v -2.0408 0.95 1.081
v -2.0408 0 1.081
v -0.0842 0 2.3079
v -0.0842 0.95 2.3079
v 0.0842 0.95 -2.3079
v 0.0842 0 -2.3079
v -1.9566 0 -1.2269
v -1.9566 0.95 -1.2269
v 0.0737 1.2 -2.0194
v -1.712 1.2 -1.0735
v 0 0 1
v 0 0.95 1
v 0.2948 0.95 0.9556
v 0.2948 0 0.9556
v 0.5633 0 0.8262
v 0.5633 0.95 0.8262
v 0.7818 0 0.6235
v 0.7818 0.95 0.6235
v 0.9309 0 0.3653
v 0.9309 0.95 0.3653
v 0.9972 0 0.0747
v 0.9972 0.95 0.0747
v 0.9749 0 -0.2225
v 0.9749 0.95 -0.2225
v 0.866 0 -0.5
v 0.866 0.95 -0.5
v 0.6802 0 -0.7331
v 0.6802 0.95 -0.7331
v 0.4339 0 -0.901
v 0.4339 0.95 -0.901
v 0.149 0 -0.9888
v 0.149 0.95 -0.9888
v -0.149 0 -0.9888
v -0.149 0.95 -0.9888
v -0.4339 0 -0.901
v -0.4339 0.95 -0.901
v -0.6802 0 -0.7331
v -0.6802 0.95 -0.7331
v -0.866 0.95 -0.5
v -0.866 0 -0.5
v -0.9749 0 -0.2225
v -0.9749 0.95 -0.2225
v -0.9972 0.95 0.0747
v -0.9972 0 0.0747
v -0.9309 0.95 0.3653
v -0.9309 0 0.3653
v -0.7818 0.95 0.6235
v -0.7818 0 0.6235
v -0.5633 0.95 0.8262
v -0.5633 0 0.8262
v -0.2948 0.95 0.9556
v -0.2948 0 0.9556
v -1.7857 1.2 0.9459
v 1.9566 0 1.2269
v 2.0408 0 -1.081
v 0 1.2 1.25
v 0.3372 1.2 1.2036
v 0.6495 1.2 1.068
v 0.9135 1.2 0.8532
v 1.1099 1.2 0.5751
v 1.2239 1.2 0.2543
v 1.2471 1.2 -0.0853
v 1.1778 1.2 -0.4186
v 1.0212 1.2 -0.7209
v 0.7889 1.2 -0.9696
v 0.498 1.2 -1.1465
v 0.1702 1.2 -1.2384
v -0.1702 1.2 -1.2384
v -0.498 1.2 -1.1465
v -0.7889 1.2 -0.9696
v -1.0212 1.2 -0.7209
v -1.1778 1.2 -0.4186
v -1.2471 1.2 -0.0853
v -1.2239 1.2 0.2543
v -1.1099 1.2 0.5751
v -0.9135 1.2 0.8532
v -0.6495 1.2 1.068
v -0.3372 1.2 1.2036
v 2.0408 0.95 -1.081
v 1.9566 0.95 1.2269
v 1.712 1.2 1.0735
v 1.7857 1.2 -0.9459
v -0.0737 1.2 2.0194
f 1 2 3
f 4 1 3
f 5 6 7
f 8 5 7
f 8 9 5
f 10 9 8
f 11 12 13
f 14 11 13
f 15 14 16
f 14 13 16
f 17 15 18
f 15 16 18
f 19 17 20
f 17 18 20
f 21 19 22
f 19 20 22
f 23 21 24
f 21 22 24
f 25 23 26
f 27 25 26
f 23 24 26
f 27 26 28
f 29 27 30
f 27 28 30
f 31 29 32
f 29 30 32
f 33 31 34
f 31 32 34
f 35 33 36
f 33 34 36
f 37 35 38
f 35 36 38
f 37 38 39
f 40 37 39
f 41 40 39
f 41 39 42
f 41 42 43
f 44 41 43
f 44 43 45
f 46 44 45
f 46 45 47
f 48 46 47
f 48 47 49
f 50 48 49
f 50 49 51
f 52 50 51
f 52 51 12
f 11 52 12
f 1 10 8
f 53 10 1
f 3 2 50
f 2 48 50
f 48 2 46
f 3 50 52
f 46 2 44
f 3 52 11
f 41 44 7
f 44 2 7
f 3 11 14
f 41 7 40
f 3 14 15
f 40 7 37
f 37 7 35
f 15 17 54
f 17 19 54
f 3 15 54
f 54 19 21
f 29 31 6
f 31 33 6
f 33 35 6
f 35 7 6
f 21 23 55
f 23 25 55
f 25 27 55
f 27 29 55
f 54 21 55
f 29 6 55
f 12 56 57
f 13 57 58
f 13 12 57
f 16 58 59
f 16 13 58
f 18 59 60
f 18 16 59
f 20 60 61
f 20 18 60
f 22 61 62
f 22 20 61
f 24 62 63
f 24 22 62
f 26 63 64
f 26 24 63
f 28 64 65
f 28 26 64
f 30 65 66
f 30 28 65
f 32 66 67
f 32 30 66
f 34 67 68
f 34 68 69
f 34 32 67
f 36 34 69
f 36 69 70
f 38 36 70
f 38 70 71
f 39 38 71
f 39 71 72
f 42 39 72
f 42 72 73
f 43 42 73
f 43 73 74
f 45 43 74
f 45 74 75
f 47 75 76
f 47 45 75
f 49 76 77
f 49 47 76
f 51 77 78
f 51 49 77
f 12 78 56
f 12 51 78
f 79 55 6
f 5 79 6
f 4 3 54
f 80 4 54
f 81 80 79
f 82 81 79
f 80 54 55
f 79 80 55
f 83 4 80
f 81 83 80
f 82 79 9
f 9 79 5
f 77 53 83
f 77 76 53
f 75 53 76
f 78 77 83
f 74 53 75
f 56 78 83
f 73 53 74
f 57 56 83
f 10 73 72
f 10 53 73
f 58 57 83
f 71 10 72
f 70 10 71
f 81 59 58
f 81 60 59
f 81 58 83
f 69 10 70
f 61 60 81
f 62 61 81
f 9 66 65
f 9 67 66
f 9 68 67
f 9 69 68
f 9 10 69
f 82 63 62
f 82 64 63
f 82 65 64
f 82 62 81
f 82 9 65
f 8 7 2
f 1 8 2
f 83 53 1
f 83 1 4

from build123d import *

# Parameters (mm, degrees)
BOSS_EXTRUDE1_DEPTH = 1.2
SKETCH2_R           = 1
CUT_EXTRUDE1_DEPTH  = 1.6
CHAMFER1_SIZE       = 0.25


with BuildPart() as part:
    # Sketch1 → Boss-Extrude1 (new body)
    with BuildSketch(Plane(origin=(0, 0, 0), x_dir=(1, 0, 0), z_dir=(0, 1, 0))):
        Polygon((-1.956558279, 1.226871238), (-2.040780799, -1.080993554), (-0.08422252, -2.307864793), (1.956558279, -1.226871238), (2.040780799, 1.080993554), (0.08422252, 2.307864793), align=None)
    extrude(amount=BOSS_EXTRUDE1_DEPTH)

    # Sketch2 → Cut-Extrude1 (cut)
    with BuildSketch(Plane(origin=(0, 1.2, 0), x_dir=(1, 0, 0), z_dir=(0, 1, 0))):
        with Locations(Location((0, 0, 0), (0, 0, 270))):
            Circle(SKETCH2_R)
    extrude(amount=-CUT_EXTRUDE1_DEPTH, mode=Mode.SUBTRACT)

    # Chamfer1
    chamfer1_edges = [part.edges().sort_by_distance(p)[0] for p in [
        (-1.062501659, 1.2, 1.694429173),
        (0.936167879, 1.2, 1.767368015),
        (1.998669539, 1.2, 0.072938842),
        (0, 1.2, -1),
        (1.062501659, 1.2, -1.694429173),
        (-0.936167879, 1.2, -1.767368015),
        (-1.998669539, 1.2, -0.072938842),
    ]]
    chamfer(chamfer1_edges, length=CHAMFER1_SIZE)


solid = part.part
